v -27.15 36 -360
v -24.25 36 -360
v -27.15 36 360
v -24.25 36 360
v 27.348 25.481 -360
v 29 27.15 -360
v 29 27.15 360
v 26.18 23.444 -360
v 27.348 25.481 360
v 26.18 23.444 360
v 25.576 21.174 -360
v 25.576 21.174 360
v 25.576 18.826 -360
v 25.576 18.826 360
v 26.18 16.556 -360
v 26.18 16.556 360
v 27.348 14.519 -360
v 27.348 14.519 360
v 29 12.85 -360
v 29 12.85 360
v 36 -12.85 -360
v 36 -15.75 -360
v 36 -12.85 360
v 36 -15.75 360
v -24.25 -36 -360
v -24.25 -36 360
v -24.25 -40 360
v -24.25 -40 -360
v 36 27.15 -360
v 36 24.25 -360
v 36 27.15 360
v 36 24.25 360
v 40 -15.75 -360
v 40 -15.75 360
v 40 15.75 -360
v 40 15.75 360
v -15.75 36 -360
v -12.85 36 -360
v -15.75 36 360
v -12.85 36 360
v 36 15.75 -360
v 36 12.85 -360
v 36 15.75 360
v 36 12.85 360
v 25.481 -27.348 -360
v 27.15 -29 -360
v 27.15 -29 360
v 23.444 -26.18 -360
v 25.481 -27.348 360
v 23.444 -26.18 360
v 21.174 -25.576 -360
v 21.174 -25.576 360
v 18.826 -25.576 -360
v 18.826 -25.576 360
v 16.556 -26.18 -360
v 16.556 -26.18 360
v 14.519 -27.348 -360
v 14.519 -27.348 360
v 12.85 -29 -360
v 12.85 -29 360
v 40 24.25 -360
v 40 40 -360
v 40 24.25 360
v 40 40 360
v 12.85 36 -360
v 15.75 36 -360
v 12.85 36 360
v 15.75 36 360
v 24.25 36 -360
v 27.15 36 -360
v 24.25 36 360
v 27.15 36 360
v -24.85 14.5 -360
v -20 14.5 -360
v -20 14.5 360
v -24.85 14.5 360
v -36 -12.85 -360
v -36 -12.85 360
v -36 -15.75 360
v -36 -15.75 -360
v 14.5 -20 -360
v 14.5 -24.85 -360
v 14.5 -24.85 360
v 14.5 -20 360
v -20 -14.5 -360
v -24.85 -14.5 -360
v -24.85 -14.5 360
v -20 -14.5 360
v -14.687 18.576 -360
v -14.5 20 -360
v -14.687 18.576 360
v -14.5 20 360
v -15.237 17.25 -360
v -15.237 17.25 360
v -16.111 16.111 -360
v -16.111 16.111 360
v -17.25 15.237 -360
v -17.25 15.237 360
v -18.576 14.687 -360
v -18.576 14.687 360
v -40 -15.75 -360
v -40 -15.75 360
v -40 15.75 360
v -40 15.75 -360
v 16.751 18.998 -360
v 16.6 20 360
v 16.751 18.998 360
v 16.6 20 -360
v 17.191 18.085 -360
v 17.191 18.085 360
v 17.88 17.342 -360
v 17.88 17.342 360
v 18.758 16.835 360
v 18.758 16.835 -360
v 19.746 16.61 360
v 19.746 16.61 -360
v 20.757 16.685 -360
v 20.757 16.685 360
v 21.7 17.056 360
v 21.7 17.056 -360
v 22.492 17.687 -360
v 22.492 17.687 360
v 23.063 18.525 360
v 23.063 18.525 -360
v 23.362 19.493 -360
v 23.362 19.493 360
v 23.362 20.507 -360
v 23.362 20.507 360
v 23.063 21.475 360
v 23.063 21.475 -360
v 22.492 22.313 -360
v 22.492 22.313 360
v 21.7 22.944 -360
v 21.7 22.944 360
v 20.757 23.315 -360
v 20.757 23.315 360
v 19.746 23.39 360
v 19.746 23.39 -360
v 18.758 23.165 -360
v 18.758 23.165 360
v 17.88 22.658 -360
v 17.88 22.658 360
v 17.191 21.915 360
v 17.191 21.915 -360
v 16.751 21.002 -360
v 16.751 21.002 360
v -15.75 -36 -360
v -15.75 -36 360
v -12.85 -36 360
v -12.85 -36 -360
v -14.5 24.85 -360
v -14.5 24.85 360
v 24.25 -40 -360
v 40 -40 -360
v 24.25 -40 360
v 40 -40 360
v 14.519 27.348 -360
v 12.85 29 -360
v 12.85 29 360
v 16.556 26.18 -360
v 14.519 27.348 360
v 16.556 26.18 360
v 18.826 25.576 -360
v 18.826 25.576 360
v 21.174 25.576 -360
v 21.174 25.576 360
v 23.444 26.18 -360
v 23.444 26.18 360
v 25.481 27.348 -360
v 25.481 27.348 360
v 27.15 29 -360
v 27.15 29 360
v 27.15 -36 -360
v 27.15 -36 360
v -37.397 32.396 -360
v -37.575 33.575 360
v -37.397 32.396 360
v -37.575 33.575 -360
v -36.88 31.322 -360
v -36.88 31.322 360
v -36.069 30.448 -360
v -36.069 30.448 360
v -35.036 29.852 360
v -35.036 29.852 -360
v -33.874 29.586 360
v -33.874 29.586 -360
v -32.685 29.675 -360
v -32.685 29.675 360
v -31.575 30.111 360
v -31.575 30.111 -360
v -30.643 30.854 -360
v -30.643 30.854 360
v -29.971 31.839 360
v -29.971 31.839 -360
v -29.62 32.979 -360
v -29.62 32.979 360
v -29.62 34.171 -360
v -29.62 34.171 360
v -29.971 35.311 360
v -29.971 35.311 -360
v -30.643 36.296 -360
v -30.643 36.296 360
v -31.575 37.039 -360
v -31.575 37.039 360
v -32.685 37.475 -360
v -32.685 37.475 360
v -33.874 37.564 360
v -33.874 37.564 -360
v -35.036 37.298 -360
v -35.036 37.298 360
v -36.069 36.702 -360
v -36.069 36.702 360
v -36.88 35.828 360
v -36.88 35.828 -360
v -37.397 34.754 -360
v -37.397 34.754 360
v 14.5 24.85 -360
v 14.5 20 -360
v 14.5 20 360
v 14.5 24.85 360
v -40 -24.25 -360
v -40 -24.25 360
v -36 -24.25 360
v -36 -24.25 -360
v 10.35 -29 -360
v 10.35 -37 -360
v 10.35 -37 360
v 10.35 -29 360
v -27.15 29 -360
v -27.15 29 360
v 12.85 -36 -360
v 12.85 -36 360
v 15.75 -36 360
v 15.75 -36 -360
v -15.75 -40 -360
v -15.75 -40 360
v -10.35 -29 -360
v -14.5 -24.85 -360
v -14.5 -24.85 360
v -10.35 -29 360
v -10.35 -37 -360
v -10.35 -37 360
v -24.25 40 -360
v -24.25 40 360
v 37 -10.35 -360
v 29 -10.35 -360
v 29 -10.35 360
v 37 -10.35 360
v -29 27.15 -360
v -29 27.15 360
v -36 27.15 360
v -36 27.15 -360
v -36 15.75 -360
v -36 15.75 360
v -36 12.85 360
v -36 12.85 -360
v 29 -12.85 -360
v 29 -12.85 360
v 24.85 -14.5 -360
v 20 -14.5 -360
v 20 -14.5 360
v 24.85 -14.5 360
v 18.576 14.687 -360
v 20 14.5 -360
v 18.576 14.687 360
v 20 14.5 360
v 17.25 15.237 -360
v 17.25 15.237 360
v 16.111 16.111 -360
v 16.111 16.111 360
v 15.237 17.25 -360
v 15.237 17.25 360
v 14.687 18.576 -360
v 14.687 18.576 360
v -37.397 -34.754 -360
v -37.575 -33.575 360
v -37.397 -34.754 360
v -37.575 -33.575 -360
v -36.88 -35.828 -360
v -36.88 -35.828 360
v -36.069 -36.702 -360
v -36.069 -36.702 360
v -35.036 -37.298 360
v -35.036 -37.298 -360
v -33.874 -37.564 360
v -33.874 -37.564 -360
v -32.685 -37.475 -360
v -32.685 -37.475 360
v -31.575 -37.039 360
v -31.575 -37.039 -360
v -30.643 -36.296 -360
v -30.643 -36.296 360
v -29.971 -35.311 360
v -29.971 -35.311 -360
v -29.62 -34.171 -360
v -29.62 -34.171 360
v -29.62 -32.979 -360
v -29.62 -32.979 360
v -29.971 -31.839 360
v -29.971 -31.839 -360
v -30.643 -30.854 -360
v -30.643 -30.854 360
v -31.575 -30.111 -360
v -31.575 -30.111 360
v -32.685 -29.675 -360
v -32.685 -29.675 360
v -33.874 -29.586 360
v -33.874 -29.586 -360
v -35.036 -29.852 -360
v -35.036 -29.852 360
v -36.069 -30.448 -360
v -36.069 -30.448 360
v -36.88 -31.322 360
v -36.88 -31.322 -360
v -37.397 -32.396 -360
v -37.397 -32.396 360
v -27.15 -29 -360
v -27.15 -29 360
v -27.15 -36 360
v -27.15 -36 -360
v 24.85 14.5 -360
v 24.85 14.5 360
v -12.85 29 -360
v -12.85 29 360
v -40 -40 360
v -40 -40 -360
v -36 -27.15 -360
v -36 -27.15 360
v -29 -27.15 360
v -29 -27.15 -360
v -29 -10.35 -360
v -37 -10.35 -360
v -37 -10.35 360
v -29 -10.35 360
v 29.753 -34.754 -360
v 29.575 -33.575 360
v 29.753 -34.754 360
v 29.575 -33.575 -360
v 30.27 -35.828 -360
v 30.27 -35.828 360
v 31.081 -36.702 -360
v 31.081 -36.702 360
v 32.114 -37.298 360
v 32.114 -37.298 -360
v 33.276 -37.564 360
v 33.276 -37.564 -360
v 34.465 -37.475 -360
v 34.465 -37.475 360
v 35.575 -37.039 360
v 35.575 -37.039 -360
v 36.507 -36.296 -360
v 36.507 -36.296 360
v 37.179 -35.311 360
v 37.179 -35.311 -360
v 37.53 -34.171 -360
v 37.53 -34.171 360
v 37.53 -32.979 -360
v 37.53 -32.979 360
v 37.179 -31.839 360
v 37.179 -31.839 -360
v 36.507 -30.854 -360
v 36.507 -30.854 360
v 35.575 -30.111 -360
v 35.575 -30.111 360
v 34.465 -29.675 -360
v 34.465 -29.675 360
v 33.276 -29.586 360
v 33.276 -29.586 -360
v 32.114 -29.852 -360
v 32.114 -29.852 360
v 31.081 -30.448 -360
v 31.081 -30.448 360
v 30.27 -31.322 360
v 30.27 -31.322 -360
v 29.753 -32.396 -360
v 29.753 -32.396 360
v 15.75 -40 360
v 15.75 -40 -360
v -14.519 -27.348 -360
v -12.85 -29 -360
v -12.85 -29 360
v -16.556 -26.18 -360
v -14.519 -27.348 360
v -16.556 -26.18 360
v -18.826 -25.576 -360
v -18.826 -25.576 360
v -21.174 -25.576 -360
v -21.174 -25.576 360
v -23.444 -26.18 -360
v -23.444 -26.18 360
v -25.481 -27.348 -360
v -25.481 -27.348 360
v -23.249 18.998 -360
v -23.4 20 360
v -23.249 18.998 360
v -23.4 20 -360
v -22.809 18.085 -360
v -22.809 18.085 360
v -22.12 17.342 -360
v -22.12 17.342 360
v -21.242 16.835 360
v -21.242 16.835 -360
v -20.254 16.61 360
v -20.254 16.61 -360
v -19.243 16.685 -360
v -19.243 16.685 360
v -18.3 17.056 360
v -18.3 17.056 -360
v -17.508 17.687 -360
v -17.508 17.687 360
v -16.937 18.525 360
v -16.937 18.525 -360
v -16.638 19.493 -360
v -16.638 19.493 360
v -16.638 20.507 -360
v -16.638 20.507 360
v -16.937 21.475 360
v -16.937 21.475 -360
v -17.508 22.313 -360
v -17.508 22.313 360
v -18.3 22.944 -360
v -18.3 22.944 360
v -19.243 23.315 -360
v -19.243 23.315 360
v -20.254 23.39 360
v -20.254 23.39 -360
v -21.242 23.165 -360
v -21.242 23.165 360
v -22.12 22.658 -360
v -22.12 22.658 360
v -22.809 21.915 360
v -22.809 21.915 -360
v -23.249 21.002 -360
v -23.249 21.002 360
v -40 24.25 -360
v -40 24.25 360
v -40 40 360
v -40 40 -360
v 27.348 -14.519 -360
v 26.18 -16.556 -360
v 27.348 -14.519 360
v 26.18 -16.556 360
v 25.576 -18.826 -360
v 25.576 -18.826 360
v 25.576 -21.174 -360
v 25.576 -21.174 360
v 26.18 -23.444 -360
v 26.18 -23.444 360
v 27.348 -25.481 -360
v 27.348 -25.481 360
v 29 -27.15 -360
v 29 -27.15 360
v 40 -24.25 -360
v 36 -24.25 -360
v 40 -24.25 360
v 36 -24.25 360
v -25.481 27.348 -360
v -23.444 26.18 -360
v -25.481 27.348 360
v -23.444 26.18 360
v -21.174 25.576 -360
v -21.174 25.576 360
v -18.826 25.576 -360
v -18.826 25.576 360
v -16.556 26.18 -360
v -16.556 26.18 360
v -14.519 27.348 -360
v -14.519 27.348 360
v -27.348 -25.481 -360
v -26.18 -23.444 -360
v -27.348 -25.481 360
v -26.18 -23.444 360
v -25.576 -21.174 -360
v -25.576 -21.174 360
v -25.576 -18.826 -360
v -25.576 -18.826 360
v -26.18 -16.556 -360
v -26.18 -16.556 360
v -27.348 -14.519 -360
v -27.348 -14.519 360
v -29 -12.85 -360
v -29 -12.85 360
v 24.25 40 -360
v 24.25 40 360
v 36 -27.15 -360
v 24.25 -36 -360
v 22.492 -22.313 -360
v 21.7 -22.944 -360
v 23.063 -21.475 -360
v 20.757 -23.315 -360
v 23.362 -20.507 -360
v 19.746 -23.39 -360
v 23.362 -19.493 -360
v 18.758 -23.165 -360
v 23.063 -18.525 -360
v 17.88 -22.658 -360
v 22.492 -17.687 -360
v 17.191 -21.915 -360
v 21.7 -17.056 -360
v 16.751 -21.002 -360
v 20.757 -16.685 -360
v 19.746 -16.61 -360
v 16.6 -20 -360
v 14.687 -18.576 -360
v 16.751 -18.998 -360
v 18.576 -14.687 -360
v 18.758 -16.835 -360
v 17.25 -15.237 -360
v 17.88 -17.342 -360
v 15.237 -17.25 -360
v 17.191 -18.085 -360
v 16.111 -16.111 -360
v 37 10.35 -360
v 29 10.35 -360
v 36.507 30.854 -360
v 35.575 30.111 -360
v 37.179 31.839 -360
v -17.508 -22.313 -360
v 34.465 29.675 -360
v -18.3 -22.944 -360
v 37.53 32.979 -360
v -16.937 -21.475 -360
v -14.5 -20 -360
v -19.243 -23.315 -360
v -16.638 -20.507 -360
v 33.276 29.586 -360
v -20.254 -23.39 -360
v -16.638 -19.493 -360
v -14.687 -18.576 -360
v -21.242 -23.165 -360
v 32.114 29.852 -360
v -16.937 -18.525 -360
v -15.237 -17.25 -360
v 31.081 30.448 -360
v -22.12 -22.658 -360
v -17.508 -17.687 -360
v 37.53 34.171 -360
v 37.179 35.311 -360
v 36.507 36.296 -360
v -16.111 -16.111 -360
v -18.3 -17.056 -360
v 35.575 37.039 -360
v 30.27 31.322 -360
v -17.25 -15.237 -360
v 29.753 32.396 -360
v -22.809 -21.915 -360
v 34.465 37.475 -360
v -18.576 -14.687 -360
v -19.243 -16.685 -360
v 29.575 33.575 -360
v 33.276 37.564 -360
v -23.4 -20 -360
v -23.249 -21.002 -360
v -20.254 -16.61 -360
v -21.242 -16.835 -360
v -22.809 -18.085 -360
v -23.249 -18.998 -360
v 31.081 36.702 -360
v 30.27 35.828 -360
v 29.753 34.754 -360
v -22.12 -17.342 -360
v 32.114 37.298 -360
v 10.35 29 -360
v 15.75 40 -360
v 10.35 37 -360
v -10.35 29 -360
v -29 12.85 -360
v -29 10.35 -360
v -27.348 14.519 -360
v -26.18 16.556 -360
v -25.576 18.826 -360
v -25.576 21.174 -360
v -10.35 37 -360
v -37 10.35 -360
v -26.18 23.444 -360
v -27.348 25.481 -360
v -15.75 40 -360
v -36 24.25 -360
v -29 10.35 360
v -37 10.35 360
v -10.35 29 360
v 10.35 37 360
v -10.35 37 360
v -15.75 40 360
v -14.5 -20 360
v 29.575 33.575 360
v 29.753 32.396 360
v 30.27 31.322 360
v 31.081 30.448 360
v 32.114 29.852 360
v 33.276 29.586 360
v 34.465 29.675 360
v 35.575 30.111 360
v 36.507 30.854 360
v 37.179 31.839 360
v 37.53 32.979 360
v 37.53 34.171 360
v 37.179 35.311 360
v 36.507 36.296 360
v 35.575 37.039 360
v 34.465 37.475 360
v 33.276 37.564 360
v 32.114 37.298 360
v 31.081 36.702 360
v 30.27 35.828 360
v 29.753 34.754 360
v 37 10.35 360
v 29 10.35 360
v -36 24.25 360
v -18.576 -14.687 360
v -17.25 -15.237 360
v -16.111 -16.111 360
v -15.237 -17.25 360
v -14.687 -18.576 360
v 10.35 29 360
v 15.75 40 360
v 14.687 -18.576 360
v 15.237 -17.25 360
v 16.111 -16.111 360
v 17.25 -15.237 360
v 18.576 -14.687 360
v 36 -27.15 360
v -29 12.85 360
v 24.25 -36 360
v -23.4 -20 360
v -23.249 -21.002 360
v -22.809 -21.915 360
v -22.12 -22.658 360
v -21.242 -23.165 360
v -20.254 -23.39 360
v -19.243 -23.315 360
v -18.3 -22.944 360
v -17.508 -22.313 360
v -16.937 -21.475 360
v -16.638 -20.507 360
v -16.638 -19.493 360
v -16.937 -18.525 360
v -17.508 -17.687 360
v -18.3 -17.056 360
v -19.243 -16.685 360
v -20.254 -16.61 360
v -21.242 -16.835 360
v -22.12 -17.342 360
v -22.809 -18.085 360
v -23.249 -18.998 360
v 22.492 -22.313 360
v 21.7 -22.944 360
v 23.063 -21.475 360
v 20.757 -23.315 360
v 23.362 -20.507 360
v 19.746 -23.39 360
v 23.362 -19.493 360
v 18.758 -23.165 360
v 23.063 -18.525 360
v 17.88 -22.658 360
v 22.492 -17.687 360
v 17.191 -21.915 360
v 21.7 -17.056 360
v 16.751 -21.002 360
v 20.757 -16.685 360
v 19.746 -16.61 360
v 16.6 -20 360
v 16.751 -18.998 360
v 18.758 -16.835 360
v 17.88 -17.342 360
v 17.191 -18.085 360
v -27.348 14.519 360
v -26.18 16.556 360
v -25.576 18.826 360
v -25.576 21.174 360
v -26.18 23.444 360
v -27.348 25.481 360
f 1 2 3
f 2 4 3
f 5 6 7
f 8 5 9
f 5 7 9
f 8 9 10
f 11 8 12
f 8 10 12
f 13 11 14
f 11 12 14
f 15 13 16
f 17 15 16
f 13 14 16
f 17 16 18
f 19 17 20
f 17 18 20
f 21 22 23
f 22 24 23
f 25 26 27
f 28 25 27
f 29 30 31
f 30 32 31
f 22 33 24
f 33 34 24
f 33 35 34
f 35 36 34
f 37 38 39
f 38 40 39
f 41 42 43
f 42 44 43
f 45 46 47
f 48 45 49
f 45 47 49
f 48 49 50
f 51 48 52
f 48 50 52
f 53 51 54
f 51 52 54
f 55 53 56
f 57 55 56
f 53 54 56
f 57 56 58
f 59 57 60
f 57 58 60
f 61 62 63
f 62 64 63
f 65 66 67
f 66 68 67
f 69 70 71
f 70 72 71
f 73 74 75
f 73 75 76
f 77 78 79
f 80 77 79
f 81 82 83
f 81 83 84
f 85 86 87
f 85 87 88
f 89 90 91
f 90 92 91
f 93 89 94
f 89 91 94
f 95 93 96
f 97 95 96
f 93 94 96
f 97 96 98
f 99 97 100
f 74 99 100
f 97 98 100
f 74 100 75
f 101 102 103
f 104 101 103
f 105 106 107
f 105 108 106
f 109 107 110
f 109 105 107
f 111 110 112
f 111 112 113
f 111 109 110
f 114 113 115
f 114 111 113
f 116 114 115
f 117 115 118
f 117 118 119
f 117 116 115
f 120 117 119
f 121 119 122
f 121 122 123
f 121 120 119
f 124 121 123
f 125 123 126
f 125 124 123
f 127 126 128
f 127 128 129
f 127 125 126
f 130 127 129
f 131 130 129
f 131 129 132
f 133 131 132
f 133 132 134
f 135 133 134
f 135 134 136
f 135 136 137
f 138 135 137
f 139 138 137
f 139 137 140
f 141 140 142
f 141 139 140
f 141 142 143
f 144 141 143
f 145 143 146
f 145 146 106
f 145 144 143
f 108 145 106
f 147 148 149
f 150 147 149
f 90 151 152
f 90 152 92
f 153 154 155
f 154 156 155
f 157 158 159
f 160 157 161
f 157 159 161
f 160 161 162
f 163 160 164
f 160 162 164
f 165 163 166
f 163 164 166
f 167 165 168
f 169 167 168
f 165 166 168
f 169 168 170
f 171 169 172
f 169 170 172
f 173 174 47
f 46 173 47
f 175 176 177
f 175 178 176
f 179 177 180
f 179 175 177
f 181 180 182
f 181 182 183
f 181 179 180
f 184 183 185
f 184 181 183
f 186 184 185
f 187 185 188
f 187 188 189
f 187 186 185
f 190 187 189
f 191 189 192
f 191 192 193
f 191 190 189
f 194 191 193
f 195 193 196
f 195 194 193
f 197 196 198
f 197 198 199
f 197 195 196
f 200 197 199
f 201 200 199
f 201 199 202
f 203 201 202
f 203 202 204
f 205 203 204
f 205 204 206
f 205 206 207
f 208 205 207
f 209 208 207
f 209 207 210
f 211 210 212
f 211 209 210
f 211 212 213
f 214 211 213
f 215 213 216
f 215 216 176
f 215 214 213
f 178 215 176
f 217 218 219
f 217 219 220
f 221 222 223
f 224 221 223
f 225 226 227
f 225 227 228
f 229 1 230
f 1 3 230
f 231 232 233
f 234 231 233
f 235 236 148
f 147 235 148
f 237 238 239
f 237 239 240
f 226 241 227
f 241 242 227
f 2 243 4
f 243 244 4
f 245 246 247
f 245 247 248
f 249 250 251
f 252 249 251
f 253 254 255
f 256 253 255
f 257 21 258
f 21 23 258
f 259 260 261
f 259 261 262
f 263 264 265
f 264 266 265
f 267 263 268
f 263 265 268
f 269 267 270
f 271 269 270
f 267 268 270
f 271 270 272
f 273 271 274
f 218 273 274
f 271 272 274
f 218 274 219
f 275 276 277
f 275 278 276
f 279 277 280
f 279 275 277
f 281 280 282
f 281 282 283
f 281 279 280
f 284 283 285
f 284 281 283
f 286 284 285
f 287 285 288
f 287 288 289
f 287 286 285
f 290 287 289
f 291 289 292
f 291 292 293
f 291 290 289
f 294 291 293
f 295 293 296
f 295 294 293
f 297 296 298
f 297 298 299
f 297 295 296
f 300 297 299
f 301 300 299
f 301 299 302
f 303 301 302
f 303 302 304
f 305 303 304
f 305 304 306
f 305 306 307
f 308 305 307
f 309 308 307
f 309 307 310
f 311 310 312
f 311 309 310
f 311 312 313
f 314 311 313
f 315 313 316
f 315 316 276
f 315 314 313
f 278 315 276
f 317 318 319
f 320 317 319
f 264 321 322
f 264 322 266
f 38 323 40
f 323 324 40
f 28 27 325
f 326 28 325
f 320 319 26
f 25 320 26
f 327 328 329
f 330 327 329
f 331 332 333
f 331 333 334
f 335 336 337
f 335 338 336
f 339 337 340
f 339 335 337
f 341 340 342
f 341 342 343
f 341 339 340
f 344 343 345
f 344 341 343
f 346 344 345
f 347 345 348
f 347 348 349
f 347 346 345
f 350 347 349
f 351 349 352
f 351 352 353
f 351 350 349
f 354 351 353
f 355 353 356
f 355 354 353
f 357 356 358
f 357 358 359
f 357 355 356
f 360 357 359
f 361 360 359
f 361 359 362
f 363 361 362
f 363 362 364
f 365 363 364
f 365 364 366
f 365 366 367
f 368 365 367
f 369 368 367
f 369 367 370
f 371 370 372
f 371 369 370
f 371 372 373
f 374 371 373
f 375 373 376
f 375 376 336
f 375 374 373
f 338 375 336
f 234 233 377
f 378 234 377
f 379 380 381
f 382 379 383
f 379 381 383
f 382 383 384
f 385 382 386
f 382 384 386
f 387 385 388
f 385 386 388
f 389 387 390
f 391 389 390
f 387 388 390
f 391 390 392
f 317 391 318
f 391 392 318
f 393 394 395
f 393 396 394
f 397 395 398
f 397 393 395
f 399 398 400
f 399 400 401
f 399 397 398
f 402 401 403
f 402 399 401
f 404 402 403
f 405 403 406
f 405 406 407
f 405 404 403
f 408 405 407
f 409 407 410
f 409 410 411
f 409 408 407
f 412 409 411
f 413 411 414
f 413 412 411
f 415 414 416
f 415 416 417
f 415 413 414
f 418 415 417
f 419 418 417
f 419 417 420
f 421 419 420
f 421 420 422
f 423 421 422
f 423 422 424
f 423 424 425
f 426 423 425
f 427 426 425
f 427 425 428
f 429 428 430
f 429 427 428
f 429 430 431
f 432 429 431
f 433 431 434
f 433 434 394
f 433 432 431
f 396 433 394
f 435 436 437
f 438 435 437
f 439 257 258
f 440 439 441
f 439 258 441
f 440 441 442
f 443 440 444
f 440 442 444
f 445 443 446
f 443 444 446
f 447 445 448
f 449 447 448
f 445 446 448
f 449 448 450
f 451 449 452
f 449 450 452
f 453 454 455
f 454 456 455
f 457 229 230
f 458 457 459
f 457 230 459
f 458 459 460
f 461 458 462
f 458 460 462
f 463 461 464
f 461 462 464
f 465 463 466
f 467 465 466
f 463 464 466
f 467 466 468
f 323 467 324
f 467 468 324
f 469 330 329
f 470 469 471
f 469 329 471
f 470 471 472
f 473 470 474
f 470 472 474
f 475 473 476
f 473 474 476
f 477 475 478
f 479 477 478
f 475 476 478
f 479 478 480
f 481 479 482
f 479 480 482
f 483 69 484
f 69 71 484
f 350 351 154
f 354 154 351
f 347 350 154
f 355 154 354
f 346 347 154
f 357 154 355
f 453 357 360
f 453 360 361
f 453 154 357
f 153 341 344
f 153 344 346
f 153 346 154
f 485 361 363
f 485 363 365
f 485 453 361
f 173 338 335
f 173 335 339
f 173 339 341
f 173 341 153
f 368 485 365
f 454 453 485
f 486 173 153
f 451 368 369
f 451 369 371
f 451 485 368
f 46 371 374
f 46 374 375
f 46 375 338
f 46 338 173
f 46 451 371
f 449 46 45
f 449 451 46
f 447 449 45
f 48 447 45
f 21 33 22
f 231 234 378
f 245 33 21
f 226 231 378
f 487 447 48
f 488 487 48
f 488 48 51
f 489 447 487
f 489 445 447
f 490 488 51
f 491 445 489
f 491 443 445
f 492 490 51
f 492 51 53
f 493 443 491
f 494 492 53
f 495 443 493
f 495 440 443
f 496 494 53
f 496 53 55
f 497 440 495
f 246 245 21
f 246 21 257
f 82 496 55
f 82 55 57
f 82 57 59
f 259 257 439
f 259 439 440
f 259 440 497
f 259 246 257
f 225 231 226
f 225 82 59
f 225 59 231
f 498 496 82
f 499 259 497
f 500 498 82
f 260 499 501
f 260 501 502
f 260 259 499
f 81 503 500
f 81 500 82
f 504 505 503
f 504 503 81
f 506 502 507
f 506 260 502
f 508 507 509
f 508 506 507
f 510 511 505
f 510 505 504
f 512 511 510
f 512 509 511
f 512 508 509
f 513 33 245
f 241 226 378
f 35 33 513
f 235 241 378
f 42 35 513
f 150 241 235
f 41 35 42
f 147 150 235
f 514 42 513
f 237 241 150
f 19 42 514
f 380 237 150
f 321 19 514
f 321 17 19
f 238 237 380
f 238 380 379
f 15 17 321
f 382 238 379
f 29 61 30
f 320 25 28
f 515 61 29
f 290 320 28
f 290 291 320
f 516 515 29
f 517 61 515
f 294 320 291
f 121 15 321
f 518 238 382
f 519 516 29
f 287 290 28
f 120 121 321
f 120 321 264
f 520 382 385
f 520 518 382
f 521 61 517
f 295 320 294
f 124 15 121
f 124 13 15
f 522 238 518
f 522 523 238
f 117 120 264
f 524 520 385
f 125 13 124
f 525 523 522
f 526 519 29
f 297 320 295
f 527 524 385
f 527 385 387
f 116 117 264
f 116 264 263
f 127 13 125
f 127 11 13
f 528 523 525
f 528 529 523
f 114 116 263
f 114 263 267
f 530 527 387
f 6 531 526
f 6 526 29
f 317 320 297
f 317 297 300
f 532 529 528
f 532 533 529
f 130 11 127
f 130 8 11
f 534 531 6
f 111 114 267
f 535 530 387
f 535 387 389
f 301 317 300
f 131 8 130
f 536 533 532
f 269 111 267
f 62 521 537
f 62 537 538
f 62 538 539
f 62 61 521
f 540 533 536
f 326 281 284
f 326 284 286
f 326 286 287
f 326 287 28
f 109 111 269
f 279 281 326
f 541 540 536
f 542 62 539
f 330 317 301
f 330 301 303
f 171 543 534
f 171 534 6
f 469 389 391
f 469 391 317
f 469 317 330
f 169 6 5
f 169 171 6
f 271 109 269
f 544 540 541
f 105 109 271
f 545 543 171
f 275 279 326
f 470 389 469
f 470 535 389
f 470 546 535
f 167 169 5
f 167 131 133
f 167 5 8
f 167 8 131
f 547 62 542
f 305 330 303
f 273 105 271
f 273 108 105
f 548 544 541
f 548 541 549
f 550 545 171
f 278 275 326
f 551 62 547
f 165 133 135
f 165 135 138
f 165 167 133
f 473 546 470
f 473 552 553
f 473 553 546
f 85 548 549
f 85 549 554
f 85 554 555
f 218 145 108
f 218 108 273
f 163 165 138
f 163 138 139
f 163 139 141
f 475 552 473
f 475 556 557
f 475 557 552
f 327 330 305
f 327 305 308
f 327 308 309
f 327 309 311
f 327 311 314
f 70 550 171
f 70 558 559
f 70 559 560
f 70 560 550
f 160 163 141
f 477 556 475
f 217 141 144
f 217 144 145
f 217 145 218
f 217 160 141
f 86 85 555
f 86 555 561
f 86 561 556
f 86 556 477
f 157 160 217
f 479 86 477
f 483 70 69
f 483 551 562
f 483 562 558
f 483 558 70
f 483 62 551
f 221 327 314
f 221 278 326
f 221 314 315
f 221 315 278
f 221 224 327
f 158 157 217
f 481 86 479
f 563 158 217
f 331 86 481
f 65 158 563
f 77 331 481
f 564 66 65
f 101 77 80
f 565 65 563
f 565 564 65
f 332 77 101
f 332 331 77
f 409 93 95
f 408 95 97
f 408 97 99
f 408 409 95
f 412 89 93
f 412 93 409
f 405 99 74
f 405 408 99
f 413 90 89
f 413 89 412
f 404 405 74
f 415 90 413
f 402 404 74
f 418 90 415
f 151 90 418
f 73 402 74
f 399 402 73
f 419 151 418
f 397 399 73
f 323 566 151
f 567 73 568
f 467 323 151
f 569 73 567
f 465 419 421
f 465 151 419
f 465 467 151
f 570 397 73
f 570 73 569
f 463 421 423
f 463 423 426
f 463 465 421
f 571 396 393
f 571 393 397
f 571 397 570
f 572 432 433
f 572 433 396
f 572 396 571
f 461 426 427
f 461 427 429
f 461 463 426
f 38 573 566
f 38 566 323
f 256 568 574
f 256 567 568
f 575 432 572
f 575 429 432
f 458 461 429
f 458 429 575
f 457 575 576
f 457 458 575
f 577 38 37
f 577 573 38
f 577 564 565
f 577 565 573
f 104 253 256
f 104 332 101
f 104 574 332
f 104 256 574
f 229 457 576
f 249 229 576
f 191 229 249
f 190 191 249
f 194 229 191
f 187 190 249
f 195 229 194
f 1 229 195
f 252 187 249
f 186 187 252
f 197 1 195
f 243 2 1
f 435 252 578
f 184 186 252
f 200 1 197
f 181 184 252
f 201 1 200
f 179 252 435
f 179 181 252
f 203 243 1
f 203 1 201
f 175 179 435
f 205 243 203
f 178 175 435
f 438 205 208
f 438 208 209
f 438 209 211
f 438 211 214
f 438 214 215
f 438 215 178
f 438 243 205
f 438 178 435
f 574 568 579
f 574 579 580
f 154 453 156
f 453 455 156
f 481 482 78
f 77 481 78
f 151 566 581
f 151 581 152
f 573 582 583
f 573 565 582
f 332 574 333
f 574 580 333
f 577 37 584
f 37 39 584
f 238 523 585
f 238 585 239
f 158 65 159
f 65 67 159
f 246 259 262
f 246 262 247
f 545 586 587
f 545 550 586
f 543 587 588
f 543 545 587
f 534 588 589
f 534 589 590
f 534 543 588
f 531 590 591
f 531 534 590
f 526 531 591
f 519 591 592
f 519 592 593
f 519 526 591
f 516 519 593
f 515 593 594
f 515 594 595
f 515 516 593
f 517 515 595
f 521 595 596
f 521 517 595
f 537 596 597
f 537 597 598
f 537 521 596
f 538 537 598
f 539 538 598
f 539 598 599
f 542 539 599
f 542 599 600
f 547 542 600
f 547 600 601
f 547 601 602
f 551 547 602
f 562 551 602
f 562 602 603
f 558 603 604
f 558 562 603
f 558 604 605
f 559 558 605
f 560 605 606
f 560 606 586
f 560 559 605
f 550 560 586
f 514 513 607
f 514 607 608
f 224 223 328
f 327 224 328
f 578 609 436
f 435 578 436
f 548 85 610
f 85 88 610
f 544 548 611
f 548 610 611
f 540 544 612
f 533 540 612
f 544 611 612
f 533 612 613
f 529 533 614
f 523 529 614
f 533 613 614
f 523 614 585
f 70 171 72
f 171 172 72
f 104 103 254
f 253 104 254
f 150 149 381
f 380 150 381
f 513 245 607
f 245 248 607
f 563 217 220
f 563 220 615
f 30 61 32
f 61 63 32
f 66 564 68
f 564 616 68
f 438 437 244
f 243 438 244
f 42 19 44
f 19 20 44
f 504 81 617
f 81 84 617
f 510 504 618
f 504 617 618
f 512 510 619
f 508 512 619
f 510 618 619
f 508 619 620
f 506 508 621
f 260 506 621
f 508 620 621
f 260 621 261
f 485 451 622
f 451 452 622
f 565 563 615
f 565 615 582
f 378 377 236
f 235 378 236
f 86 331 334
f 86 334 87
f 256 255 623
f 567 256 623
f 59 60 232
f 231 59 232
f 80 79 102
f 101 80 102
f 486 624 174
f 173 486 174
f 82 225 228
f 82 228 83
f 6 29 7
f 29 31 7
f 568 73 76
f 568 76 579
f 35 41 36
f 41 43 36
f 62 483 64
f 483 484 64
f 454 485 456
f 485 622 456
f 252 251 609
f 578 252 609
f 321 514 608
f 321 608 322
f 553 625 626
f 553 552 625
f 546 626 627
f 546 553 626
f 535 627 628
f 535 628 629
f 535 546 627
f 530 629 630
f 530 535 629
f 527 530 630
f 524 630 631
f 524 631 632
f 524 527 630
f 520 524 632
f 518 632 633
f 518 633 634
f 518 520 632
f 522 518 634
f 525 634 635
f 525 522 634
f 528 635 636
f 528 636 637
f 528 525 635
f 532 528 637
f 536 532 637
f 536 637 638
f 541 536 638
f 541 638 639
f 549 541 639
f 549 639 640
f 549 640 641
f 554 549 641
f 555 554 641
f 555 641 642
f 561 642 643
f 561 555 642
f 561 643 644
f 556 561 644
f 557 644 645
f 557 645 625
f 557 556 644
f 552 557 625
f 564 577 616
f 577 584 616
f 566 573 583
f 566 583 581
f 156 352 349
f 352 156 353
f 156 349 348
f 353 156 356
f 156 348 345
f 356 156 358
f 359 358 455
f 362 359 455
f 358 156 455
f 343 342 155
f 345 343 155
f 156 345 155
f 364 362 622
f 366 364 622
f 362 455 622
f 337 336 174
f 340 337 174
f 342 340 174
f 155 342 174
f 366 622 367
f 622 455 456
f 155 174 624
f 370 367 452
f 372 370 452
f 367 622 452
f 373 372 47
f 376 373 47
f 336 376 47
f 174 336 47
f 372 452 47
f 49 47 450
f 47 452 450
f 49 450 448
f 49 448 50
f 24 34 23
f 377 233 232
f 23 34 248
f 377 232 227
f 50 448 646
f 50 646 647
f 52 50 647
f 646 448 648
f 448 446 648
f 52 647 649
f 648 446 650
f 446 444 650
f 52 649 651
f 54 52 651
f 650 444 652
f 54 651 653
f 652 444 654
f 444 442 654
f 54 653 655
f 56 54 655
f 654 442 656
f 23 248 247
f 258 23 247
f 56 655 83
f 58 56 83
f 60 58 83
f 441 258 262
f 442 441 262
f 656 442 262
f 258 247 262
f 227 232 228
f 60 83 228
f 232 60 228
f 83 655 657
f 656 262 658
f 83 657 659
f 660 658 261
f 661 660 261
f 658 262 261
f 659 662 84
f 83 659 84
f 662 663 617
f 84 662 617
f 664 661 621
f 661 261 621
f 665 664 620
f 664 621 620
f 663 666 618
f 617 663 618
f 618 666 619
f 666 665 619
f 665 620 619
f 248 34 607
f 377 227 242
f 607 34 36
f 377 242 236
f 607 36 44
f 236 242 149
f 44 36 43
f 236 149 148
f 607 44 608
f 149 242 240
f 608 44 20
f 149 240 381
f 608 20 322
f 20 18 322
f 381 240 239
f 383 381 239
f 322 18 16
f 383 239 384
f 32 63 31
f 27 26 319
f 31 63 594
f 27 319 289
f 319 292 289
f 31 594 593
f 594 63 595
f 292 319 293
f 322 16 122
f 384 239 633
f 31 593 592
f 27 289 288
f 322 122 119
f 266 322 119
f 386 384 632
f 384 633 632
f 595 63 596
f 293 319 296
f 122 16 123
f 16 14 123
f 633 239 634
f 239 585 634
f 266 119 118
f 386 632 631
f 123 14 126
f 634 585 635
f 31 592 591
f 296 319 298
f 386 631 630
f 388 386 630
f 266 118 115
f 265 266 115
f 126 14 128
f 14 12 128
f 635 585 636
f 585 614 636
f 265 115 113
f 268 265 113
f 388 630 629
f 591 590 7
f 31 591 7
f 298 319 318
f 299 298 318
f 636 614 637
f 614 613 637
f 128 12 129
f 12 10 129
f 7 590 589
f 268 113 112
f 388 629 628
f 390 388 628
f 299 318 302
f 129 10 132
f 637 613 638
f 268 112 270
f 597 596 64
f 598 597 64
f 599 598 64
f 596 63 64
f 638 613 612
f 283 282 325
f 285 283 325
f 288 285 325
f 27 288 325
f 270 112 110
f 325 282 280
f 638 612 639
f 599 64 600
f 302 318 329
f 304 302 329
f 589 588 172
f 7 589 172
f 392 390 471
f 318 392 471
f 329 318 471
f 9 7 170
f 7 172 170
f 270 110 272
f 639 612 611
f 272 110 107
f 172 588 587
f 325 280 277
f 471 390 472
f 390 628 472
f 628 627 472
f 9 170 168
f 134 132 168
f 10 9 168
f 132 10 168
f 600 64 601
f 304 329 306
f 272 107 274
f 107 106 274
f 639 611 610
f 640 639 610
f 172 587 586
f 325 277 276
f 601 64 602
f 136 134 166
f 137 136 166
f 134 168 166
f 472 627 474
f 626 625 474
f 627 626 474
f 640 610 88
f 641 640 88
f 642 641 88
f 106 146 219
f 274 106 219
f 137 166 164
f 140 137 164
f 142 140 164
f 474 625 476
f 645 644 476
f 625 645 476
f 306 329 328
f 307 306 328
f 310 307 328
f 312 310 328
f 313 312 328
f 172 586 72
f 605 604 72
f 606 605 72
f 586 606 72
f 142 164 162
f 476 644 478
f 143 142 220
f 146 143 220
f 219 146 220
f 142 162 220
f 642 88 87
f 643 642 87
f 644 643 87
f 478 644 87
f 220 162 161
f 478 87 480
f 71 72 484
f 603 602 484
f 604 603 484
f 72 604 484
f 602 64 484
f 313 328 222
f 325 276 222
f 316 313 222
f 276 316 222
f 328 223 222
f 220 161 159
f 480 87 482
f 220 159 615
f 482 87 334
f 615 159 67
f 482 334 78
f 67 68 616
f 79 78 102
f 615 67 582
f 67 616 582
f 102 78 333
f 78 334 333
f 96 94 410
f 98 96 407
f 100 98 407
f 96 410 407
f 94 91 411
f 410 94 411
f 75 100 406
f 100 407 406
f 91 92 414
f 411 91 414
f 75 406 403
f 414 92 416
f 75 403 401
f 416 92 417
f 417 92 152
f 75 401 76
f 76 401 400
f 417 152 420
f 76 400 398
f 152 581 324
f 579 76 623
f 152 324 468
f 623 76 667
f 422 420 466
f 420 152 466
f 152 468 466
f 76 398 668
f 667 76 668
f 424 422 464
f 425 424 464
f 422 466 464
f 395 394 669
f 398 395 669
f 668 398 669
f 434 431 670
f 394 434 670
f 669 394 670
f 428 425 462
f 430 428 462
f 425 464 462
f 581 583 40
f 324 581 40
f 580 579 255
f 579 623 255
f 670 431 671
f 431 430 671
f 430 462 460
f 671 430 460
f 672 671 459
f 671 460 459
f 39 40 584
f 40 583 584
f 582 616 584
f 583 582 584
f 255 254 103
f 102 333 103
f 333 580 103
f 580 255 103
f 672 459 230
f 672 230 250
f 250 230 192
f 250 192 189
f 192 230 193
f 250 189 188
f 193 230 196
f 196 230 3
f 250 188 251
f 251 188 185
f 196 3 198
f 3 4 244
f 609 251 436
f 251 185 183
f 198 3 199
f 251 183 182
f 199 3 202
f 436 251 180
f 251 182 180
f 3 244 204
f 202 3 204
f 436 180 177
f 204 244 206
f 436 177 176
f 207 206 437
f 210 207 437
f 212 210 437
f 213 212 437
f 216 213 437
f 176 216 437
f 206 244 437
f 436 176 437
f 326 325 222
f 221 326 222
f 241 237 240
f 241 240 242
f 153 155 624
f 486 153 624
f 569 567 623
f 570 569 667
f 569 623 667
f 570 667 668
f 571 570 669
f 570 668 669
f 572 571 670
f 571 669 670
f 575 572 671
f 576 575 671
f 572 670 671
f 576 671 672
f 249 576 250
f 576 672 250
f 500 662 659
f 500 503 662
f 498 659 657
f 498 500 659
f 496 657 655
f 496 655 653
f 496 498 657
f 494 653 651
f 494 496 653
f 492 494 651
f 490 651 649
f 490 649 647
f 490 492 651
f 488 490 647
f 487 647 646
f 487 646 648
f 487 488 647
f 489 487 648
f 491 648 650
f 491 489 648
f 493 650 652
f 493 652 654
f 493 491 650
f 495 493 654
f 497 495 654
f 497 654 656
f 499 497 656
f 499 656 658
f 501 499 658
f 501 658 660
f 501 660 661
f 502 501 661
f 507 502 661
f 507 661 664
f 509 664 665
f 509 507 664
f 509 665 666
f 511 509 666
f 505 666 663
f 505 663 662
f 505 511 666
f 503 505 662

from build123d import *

# Parameters (mm, degrees)
SKETCH_1_R      = 3.4
SKETCH_1_R_2    = 4
EXTRUDE_1_DEPTH = 360


with BuildPart() as part:
    # 草图1 → 凸台-拉伸1 (new, symmetric)
    with BuildSketch(Plane.XY):
        with BuildLine():
            Line((-40, 40), (-24.25, 40))
            Line((-24.25, 40), (-24.25, 36))
            Line((-24.25, 36), (-27.15, 36))
            Line((-27.15, 36), (-27.15, 29))
            ThreePointArc((-27.15, 29), (-20, 25.5), (-12.85, 29))
            Line((-12.85, 29), (-12.85, 36))
            Line((-12.85, 36), (-15.75, 36))
            Line((-15.75, 36), (-15.75, 40))
            Line((-15.75, 40), (15.75, 40))
            Line((15.75, 40), (15.75, 36))
            Line((15.75, 36), (12.85, 36))
            Line((12.85, 36), (12.85, 29))
            ThreePointArc((12.85, 29), (20, 25.5), (27.15, 29))
            Line((27.15, 29), (27.15, 36))
            Line((27.15, 36), (24.25, 36))
            Line((24.25, 36), (24.25, 40))
            Line((24.25, 40), (40, 40))
            Line((40, 40), (40, 24.25))
            Line((40, 24.25), (36, 24.25))
            Line((36, 24.25), (36, 27.15))
            Line((36, 27.15), (29, 27.15))
            ThreePointArc((29, 27.15), (25.5, 20), (29, 12.85))
            Line((29, 12.85), (36, 12.85))
            Line((36, 12.85), (36, 15.75))
            Line((36, 15.75), (40.000271684, 15.75))
            Line((40.000271684, 15.75), (40.000271684, -15.75))
            Line((40.000271684, -15.75), (36, -15.75))
            Line((36, -15.75), (36, -12.85))
            Line((36, -12.85), (29, -12.85))
            ThreePointArc((29, -12.85), (25.5, -20), (29, -27.15))
            Line((29, -27.15), (36, -27.15))
            Line((36, -27.15), (36, -24.25))
            Line((36, -24.25), (40, -24.25))
            Line((40, -24.25), (40, -40))
            Line((40, -40), (24.25, -40))
            Line((24.25, -40), (24.25, -36))
            Line((24.25, -36), (27.15, -36))
            Line((27.15, -36), (27.15, -29))
            ThreePointArc((27.15, -29), (20, -25.5), (12.85, -29))
            Line((12.85, -29), (12.85, -36))
            Line((12.85, -36), (15.75, -36))
            Line((15.75, -36), (15.75, -40))
            Line((15.75, -40), (-15.75, -40))
            Line((-15.75, -40), (-15.75, -36))
            Line((-15.75, -36), (-12.85, -36))
            Line((-12.85, -36), (-12.85, -29))
            ThreePointArc((-12.85, -29), (-20, -25.5), (-27.15, -29))
            Line((-27.15, -29), (-27.15, -36))
            Line((-27.15, -36), (-24.25, -36))
            Line((-24.25, -36), (-24.25, -40))
            Line((-24.25, -40), (-40, -40))
            Line((-40, -40), (-40, -24.25))
            Line((-40, -24.25), (-36, -24.25))
            Line((-36, -24.25), (-36, -27.15))
            Line((-36, -27.15), (-29, -27.15))
            ThreePointArc((-29, -27.15), (-25.5, -20), (-29, -12.85))
            Line((-29, -12.85), (-36, -12.85))
            Line((-36, -12.85), (-36, -15.75))
            Line((-36, -15.75), (-40.000271684, -15.75))
            Line((-40.000271684, -15.75), (-40.000271684, 15.75))
            Line((-40.000271684, 15.75), (-36, 15.75))
            Line((-36, 15.75), (-36, 12.85))
            Line((-36, 12.85), (-29, 12.85))
            ThreePointArc((-29, 12.85), (-25.5, 20), (-29, 27.15))
            Line((-29, 27.15), (-36, 27.15))
            Line((-36, 27.15), (-36, 24.25))
            Line((-36, 24.25), (-40, 24.25))
            Line((-40, 24.25), (-40, 40))
        make_face()
        with Locations(Location((-20, 20, 0), (0, 0, 180))):
            Circle(SKETCH_1_R, mode=Mode.SUBTRACT)
        with Locations(Location((-33.575, 33.575, 0), (0, 0, 180))):
            Circle(SKETCH_1_R_2, mode=Mode.SUBTRACT)
        with Locations(Location((33.575, 33.575, 0), (0, 0, 180))):
            Circle(SKETCH_1_R_2, mode=Mode.SUBTRACT)
        with Locations(Location((20, 20, 0), (0, 0, 180))):
            Circle(SKETCH_1_R, mode=Mode.SUBTRACT)
        with Locations(Location((20, -20, 0), (0, 0, 180))):
            Circle(SKETCH_1_R, mode=Mode.SUBTRACT)
        with Locations(Location((33.575, -33.575, 0), (0, 0, 180))):
            Circle(SKETCH_1_R_2, mode=Mode.SUBTRACT)
        with Locations(Location((-33.575, -33.575, 0), (0, 0, 180))):
            Circle(SKETCH_1_R_2, mode=Mode.SUBTRACT)
        with Locations(Location((-20, -20, 0), (0, 0, 180))):
            Circle(SKETCH_1_R, mode=Mode.SUBTRACT)
        with BuildLine():
            Line((10.35, 37), (-10.35, 37))
            Line((-10.35, 37), (-10.35, 29))
            Line((-10.35, 29), (-14.5, 24.85))
            Line((-14.5, 24.85), (-14.5, 20))
            ThreePointArc((-14.5, 20), (-16.110912703, 16.110912703), (-20, 14.5))
            Line((-20, 14.5), (-24.85, 14.5))
            Line((-24.85, 14.5), (-29, 10.35))
            Line((-29, 10.35), (-37, 10.35))
            Line((-37, 10.35), (-37, -10.35))
            Line((-37, -10.35), (-29, -10.35))
            Line((-29, -10.35), (-24.85, -14.5))
            Line((-24.85, -14.5), (-20, -14.5))
            ThreePointArc((-20, -14.5), (-16.110912703, -16.110912703), (-14.5, -20))
            Line((-14.5, -20), (-14.5, -24.85))
            Line((-14.5, -24.85), (-10.35, -29))
            Line((-10.35, -29), (-10.35, -37))
            Line((-10.35, -37), (10.35, -37))
            Line((10.35, -37), (10.35, -29))
            Line((10.35, -29), (14.5, -24.85))
            Line((14.5, -24.85), (14.5, -20))
            ThreePointArc((14.5, -20), (16.110912703, -16.110912703), (20, -14.5))
            Line((20, -14.5), (24.85, -14.5))
            Line((24.85, -14.5), (29, -10.35))
            Line((29, -10.35), (37, -10.35))
            Line((37, -10.35), (37, 10.35))
            Line((37, 10.35), (29, 10.35))
            Line((29, 10.35), (24.85, 14.5))
            Line((24.85, 14.5), (20, 14.5))
            ThreePointArc((20, 14.5), (16.110912703, 16.110912703), (14.5, 20))
            Line((14.5, 20), (14.5, 24.85))
            Line((14.5, 24.85), (10.35, 29))
            Line((10.35, 29), (10.35, 37))
        make_face(mode=Mode.SUBTRACT)
    extrude(amount=EXTRUDE_1_DEPTH, both=True)


solid = part.part
